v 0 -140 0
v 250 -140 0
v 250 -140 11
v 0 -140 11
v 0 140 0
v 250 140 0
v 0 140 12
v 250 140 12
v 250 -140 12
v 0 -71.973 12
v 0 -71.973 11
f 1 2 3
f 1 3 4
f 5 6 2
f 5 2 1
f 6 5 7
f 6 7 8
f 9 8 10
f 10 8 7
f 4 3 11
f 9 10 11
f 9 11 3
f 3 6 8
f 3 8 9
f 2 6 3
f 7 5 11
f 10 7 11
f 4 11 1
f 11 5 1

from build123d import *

# Parameters (mm, degrees)
PAD_DEPTH    = 12
POCKET_DEPTH = 1


with BuildPart() as part:
    # Sketch → Pad (new body)
    with BuildSketch(Plane.XY):
        Polygon((0, 0), (0, 140), (250, 140), (250, -140), (0, -140), align=None)
    extrude(amount=PAD_DEPTH)

    # Sketch002 (on Face7 of Pad) → Pocket (cut)
    with BuildSketch(Plane.XY.offset(12)):
        Polygon((0, -140), (0, -71.973152), (250, -140), align=None)
    extrude(amount=-POCKET_DEPTH, mode=Mode.SUBTRACT)


solid = part.part
